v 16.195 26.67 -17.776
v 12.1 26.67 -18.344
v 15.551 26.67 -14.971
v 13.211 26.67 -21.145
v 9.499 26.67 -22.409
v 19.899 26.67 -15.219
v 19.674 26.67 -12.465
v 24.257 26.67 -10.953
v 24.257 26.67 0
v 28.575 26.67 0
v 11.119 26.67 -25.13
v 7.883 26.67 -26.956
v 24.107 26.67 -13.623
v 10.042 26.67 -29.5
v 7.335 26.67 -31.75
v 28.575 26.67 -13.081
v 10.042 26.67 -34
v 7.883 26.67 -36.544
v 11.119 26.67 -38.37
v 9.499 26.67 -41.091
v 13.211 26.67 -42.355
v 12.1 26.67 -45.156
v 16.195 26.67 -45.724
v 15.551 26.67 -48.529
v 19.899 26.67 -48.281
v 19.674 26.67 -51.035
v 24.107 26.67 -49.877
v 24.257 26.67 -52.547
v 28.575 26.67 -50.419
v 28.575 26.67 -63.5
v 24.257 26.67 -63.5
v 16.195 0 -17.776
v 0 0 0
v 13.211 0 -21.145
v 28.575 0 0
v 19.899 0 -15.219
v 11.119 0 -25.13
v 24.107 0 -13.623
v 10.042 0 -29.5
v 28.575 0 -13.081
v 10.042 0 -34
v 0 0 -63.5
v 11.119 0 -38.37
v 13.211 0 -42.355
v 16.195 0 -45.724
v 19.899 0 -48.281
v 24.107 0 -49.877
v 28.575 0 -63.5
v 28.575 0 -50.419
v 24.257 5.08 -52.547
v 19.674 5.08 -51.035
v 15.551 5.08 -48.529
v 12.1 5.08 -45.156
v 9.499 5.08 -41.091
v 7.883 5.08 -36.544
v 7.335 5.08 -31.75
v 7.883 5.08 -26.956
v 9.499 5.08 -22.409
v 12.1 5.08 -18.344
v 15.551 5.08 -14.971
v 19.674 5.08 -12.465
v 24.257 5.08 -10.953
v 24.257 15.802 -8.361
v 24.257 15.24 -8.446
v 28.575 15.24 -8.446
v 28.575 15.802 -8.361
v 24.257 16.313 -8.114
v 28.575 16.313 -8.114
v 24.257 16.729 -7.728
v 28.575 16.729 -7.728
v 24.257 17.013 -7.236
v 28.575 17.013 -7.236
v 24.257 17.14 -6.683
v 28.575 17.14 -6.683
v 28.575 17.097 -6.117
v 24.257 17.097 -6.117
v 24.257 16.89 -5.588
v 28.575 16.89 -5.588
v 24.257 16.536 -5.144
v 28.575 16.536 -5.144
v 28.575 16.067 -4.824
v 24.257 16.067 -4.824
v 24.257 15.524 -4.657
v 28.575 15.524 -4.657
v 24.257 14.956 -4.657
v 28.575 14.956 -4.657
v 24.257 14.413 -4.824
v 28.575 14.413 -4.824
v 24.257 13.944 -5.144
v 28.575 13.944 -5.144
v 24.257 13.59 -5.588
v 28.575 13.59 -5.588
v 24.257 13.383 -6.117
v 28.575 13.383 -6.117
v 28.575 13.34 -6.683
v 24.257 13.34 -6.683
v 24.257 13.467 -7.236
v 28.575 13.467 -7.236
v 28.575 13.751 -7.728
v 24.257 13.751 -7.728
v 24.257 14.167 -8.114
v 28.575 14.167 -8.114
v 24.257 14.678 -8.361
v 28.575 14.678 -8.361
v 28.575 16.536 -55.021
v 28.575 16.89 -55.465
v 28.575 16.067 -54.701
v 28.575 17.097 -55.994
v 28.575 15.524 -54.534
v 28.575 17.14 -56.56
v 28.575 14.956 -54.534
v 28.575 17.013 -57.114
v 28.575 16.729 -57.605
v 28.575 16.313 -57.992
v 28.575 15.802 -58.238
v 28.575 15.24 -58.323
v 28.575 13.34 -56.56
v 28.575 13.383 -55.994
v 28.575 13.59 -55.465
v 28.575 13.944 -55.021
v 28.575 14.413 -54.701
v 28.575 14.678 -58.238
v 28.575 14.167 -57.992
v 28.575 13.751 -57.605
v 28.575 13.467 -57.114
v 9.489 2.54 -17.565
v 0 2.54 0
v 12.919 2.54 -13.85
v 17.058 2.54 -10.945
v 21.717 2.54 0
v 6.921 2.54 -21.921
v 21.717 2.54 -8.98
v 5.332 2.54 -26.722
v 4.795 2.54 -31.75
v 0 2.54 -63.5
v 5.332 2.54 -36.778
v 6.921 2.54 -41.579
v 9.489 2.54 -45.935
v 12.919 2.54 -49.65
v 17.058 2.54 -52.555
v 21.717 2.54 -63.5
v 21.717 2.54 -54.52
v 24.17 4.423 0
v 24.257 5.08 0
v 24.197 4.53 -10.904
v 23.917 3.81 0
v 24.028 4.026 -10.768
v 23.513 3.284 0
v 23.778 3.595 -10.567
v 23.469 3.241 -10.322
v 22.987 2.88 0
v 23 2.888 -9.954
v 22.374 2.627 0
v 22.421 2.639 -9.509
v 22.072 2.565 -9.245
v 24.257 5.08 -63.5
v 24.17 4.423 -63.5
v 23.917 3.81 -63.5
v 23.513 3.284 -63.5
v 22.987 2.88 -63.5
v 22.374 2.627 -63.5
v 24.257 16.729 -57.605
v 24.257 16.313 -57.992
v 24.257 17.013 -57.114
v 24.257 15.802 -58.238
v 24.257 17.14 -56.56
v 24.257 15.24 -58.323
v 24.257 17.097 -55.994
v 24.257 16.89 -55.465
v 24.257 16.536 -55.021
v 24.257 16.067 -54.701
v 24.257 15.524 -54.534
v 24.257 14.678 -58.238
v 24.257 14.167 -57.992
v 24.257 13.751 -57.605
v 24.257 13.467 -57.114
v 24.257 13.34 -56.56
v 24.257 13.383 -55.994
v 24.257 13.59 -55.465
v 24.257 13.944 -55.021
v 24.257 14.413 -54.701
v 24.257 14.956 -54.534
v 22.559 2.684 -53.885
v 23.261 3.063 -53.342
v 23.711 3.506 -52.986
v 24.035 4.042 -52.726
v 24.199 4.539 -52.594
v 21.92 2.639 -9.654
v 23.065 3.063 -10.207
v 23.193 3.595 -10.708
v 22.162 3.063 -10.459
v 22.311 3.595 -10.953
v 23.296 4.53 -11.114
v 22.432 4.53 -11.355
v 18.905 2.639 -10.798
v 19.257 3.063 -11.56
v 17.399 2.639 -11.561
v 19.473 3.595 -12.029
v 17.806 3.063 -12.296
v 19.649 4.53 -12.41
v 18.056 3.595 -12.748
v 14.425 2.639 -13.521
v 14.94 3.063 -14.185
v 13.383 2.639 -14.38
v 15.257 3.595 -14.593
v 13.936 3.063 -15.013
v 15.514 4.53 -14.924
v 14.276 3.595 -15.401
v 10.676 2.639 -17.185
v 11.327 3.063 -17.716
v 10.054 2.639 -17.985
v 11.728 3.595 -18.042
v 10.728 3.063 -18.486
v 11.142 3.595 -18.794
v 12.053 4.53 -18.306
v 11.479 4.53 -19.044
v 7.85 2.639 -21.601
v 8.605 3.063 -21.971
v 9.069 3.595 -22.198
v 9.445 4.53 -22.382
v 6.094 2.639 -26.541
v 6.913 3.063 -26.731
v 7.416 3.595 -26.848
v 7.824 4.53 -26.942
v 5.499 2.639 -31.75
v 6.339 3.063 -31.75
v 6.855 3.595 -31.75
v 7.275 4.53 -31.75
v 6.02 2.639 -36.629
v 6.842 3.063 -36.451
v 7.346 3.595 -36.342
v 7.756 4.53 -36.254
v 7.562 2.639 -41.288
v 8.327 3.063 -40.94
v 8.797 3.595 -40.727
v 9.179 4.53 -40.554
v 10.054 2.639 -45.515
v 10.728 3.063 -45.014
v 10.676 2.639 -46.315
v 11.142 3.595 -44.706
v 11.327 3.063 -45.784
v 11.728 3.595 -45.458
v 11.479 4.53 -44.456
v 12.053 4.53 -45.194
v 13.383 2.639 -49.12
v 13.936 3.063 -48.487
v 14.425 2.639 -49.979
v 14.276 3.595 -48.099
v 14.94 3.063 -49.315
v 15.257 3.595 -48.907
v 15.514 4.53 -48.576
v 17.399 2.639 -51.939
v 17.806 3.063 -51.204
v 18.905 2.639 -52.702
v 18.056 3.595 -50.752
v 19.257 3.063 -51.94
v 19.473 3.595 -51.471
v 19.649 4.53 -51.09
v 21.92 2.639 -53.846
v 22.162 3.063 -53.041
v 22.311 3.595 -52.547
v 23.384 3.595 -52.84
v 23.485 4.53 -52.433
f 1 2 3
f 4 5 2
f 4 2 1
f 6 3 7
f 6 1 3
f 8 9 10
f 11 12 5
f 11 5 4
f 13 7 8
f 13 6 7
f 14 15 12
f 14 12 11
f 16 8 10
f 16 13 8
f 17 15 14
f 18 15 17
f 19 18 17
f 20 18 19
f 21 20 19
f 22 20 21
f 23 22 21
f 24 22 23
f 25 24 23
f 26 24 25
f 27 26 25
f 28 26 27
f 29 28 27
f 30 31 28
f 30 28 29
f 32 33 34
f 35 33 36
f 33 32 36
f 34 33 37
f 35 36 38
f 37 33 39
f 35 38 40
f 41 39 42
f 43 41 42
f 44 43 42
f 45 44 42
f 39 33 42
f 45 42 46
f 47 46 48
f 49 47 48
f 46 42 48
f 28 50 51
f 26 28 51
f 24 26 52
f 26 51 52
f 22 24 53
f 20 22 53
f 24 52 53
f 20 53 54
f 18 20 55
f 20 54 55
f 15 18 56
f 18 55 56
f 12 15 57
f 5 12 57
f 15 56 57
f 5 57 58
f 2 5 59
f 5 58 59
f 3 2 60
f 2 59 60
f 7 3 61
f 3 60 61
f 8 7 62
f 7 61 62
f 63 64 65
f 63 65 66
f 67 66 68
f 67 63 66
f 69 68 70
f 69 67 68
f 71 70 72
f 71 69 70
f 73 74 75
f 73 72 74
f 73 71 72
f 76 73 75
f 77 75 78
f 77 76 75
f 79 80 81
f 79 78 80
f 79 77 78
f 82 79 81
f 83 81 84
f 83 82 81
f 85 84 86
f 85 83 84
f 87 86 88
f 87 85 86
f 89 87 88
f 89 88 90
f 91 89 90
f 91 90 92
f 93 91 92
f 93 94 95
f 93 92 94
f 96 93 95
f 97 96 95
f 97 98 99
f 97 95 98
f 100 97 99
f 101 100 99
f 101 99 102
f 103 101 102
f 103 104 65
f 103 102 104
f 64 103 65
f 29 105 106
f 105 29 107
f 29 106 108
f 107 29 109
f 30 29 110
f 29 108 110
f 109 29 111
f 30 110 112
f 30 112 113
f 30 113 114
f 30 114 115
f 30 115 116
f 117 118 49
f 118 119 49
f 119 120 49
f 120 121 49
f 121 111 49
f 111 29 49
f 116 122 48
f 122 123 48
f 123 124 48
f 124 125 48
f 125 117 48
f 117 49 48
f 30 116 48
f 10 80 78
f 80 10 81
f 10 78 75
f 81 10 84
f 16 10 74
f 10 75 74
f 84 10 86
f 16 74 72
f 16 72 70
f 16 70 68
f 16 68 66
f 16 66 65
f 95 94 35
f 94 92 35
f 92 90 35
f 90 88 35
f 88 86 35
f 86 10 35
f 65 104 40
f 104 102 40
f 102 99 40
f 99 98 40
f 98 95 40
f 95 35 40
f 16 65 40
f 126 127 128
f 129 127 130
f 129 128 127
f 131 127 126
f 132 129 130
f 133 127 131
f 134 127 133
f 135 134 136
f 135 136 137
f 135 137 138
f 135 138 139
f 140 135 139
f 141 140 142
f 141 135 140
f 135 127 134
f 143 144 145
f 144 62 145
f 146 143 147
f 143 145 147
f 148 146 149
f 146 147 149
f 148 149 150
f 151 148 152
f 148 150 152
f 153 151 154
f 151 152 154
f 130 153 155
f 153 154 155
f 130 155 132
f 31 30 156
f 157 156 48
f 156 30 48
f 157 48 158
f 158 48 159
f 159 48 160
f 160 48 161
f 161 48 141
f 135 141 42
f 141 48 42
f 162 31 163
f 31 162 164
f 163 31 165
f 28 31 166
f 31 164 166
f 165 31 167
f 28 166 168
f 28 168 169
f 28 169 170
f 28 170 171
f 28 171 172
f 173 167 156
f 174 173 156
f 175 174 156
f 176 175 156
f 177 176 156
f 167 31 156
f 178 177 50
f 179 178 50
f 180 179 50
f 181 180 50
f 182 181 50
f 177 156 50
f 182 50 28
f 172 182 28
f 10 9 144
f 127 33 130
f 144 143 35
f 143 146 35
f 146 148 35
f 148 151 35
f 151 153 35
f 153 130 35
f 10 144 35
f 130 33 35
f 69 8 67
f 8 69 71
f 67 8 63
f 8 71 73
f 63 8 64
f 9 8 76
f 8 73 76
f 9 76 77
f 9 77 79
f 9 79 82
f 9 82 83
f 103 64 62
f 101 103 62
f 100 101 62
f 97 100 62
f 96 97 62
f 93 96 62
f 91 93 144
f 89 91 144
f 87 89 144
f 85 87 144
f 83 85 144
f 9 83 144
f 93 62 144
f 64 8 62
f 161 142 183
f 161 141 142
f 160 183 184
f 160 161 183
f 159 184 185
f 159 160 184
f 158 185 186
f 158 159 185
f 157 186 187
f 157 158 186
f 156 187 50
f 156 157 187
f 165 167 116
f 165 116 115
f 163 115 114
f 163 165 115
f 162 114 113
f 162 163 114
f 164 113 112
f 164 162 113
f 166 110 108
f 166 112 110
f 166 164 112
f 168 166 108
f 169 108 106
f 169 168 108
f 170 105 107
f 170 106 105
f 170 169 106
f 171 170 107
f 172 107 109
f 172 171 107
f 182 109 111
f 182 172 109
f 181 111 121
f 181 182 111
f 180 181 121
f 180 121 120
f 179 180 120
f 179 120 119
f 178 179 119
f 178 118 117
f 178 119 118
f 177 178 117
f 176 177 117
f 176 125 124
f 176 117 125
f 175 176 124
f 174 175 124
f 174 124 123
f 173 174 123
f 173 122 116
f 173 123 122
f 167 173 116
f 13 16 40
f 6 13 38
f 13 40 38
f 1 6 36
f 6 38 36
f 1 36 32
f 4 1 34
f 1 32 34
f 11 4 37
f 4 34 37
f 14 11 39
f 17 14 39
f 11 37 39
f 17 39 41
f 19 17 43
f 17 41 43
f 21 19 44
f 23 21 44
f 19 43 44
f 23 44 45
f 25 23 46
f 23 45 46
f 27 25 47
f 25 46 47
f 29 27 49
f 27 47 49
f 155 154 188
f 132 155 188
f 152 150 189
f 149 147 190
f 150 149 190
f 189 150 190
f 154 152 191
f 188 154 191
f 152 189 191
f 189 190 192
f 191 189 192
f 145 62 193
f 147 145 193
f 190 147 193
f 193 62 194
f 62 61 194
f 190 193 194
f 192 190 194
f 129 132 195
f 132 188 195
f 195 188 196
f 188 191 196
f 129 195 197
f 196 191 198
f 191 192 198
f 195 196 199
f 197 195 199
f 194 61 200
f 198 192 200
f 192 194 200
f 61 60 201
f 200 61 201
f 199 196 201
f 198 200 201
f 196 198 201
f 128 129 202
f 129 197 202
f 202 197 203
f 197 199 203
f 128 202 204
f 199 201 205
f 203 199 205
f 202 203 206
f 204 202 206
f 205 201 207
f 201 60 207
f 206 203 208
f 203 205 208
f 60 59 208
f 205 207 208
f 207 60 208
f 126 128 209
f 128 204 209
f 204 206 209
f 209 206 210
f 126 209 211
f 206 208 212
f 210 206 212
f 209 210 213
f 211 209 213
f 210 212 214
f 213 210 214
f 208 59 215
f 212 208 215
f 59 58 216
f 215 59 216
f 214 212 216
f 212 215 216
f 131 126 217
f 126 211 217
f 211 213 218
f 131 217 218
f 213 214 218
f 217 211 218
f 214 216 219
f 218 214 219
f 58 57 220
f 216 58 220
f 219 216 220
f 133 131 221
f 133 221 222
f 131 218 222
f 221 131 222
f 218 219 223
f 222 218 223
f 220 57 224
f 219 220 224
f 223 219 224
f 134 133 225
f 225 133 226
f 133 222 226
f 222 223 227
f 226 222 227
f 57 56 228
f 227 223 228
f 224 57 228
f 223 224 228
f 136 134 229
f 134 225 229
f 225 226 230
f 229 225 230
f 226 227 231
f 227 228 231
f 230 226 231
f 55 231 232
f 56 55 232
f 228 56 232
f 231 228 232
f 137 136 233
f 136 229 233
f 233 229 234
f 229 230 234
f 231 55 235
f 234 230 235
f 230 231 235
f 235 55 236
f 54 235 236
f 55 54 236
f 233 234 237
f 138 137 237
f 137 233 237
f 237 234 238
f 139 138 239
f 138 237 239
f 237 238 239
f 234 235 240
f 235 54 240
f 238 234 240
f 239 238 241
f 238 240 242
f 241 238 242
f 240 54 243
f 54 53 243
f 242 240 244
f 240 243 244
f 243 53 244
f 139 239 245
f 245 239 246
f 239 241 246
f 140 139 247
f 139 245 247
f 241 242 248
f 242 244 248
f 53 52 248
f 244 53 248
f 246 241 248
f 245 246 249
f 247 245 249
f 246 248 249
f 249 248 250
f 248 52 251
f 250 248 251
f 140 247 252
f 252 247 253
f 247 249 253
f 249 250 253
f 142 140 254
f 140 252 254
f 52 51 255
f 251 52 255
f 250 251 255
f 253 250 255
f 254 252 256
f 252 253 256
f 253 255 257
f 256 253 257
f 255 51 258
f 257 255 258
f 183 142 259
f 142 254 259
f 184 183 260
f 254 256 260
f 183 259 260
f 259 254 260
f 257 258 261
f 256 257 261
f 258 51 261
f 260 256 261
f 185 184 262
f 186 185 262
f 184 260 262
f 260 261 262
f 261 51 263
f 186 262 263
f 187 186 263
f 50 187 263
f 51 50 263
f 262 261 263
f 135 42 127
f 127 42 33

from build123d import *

# Parameters (mm, degrees)
BOSS_EXTRUDE14_DEPTH = 2.54
BOSS_EXTRUDE15_DEPTH = 26.67
SKETCH5_R            = 1.905
CUT_EXTRUDE12_DEPTH  = 29.575
FILLET3_R            = 2.54


with BuildPart() as part:
    # Sketch3 → Boss-Extrude14 (new body)
    with BuildSketch(Plane(origin=(0, 0, 0), x_dir=(1, 0, 0), z_dir=(0, 1, 0))):
        with BuildLine():
            Line((0, 63.5), (0, 0))
            Line((0, 0), (24.257, 0))
            Line((24.257, 0), (24.257, 10.953386454))
            ThreePointArc((24.257, 10.953386454), (7.334843244, 31.75), (24.257, 52.546613546))
            Line((24.257, 52.546613546), (24.257, 63.5))
            Line((24.257, 63.5), (0, 63.5))
        make_face()
    extrude(amount=BOSS_EXTRUDE14_DEPTH)

    # Sketch3<18> → Boss-Extrude15 (add)
    with BuildSketch(Plane(origin=(0, 0, 0), x_dir=(1, 0, 0), z_dir=(0, 1, 0))):
        with BuildLine():
            Line((24.257, 10.953386454), (24.257, 0))
            Line((24.257, 0), (28.575, 0))
            Line((28.575, 0), (28.575, 13.081))
            ThreePointArc((28.575, 13.081), (9.906, 31.75), (28.575, 50.419))
            Line((28.575, 50.419), (28.575, 63.5))
            Line((28.575, 63.5), (24.257, 63.5))
            Line((24.257, 63.5), (24.257, 52.546613546))
            ThreePointArc((24.257, 52.546613546), (7.334843244, 31.75), (24.257, 10.953386454))
        make_face()
    extrude(amount=BOSS_EXTRUDE15_DEPTH)

    # Sketch5 → Cut-Extrude12 (cut, through all)
    with BuildSketch(Plane(origin=(0, 0, 0), x_dir=(0, 0, -1), z_dir=(1, 0, 0))):
        with Locations((6.5405, 15.24)):
            Circle(SKETCH5_R)
        with Locations((56.41762459, 15.24)):
            Circle(SKETCH5_R)
    extrude(amount=CUT_EXTRUDE12_DEPTH, mode=Mode.SUBTRACT)

    # Fillet3
    fillet3_edges = [part.edges().sort_by_distance(p)[0] for p in [
        (24.257, 2.54, -58.023306773),
        (24.257, 2.54, -5.476693227),
        (7.334843244, 2.54, -31.75),
    ]]
    fillet(fillet3_edges, radius=FILLET3_R)


solid = part.part
